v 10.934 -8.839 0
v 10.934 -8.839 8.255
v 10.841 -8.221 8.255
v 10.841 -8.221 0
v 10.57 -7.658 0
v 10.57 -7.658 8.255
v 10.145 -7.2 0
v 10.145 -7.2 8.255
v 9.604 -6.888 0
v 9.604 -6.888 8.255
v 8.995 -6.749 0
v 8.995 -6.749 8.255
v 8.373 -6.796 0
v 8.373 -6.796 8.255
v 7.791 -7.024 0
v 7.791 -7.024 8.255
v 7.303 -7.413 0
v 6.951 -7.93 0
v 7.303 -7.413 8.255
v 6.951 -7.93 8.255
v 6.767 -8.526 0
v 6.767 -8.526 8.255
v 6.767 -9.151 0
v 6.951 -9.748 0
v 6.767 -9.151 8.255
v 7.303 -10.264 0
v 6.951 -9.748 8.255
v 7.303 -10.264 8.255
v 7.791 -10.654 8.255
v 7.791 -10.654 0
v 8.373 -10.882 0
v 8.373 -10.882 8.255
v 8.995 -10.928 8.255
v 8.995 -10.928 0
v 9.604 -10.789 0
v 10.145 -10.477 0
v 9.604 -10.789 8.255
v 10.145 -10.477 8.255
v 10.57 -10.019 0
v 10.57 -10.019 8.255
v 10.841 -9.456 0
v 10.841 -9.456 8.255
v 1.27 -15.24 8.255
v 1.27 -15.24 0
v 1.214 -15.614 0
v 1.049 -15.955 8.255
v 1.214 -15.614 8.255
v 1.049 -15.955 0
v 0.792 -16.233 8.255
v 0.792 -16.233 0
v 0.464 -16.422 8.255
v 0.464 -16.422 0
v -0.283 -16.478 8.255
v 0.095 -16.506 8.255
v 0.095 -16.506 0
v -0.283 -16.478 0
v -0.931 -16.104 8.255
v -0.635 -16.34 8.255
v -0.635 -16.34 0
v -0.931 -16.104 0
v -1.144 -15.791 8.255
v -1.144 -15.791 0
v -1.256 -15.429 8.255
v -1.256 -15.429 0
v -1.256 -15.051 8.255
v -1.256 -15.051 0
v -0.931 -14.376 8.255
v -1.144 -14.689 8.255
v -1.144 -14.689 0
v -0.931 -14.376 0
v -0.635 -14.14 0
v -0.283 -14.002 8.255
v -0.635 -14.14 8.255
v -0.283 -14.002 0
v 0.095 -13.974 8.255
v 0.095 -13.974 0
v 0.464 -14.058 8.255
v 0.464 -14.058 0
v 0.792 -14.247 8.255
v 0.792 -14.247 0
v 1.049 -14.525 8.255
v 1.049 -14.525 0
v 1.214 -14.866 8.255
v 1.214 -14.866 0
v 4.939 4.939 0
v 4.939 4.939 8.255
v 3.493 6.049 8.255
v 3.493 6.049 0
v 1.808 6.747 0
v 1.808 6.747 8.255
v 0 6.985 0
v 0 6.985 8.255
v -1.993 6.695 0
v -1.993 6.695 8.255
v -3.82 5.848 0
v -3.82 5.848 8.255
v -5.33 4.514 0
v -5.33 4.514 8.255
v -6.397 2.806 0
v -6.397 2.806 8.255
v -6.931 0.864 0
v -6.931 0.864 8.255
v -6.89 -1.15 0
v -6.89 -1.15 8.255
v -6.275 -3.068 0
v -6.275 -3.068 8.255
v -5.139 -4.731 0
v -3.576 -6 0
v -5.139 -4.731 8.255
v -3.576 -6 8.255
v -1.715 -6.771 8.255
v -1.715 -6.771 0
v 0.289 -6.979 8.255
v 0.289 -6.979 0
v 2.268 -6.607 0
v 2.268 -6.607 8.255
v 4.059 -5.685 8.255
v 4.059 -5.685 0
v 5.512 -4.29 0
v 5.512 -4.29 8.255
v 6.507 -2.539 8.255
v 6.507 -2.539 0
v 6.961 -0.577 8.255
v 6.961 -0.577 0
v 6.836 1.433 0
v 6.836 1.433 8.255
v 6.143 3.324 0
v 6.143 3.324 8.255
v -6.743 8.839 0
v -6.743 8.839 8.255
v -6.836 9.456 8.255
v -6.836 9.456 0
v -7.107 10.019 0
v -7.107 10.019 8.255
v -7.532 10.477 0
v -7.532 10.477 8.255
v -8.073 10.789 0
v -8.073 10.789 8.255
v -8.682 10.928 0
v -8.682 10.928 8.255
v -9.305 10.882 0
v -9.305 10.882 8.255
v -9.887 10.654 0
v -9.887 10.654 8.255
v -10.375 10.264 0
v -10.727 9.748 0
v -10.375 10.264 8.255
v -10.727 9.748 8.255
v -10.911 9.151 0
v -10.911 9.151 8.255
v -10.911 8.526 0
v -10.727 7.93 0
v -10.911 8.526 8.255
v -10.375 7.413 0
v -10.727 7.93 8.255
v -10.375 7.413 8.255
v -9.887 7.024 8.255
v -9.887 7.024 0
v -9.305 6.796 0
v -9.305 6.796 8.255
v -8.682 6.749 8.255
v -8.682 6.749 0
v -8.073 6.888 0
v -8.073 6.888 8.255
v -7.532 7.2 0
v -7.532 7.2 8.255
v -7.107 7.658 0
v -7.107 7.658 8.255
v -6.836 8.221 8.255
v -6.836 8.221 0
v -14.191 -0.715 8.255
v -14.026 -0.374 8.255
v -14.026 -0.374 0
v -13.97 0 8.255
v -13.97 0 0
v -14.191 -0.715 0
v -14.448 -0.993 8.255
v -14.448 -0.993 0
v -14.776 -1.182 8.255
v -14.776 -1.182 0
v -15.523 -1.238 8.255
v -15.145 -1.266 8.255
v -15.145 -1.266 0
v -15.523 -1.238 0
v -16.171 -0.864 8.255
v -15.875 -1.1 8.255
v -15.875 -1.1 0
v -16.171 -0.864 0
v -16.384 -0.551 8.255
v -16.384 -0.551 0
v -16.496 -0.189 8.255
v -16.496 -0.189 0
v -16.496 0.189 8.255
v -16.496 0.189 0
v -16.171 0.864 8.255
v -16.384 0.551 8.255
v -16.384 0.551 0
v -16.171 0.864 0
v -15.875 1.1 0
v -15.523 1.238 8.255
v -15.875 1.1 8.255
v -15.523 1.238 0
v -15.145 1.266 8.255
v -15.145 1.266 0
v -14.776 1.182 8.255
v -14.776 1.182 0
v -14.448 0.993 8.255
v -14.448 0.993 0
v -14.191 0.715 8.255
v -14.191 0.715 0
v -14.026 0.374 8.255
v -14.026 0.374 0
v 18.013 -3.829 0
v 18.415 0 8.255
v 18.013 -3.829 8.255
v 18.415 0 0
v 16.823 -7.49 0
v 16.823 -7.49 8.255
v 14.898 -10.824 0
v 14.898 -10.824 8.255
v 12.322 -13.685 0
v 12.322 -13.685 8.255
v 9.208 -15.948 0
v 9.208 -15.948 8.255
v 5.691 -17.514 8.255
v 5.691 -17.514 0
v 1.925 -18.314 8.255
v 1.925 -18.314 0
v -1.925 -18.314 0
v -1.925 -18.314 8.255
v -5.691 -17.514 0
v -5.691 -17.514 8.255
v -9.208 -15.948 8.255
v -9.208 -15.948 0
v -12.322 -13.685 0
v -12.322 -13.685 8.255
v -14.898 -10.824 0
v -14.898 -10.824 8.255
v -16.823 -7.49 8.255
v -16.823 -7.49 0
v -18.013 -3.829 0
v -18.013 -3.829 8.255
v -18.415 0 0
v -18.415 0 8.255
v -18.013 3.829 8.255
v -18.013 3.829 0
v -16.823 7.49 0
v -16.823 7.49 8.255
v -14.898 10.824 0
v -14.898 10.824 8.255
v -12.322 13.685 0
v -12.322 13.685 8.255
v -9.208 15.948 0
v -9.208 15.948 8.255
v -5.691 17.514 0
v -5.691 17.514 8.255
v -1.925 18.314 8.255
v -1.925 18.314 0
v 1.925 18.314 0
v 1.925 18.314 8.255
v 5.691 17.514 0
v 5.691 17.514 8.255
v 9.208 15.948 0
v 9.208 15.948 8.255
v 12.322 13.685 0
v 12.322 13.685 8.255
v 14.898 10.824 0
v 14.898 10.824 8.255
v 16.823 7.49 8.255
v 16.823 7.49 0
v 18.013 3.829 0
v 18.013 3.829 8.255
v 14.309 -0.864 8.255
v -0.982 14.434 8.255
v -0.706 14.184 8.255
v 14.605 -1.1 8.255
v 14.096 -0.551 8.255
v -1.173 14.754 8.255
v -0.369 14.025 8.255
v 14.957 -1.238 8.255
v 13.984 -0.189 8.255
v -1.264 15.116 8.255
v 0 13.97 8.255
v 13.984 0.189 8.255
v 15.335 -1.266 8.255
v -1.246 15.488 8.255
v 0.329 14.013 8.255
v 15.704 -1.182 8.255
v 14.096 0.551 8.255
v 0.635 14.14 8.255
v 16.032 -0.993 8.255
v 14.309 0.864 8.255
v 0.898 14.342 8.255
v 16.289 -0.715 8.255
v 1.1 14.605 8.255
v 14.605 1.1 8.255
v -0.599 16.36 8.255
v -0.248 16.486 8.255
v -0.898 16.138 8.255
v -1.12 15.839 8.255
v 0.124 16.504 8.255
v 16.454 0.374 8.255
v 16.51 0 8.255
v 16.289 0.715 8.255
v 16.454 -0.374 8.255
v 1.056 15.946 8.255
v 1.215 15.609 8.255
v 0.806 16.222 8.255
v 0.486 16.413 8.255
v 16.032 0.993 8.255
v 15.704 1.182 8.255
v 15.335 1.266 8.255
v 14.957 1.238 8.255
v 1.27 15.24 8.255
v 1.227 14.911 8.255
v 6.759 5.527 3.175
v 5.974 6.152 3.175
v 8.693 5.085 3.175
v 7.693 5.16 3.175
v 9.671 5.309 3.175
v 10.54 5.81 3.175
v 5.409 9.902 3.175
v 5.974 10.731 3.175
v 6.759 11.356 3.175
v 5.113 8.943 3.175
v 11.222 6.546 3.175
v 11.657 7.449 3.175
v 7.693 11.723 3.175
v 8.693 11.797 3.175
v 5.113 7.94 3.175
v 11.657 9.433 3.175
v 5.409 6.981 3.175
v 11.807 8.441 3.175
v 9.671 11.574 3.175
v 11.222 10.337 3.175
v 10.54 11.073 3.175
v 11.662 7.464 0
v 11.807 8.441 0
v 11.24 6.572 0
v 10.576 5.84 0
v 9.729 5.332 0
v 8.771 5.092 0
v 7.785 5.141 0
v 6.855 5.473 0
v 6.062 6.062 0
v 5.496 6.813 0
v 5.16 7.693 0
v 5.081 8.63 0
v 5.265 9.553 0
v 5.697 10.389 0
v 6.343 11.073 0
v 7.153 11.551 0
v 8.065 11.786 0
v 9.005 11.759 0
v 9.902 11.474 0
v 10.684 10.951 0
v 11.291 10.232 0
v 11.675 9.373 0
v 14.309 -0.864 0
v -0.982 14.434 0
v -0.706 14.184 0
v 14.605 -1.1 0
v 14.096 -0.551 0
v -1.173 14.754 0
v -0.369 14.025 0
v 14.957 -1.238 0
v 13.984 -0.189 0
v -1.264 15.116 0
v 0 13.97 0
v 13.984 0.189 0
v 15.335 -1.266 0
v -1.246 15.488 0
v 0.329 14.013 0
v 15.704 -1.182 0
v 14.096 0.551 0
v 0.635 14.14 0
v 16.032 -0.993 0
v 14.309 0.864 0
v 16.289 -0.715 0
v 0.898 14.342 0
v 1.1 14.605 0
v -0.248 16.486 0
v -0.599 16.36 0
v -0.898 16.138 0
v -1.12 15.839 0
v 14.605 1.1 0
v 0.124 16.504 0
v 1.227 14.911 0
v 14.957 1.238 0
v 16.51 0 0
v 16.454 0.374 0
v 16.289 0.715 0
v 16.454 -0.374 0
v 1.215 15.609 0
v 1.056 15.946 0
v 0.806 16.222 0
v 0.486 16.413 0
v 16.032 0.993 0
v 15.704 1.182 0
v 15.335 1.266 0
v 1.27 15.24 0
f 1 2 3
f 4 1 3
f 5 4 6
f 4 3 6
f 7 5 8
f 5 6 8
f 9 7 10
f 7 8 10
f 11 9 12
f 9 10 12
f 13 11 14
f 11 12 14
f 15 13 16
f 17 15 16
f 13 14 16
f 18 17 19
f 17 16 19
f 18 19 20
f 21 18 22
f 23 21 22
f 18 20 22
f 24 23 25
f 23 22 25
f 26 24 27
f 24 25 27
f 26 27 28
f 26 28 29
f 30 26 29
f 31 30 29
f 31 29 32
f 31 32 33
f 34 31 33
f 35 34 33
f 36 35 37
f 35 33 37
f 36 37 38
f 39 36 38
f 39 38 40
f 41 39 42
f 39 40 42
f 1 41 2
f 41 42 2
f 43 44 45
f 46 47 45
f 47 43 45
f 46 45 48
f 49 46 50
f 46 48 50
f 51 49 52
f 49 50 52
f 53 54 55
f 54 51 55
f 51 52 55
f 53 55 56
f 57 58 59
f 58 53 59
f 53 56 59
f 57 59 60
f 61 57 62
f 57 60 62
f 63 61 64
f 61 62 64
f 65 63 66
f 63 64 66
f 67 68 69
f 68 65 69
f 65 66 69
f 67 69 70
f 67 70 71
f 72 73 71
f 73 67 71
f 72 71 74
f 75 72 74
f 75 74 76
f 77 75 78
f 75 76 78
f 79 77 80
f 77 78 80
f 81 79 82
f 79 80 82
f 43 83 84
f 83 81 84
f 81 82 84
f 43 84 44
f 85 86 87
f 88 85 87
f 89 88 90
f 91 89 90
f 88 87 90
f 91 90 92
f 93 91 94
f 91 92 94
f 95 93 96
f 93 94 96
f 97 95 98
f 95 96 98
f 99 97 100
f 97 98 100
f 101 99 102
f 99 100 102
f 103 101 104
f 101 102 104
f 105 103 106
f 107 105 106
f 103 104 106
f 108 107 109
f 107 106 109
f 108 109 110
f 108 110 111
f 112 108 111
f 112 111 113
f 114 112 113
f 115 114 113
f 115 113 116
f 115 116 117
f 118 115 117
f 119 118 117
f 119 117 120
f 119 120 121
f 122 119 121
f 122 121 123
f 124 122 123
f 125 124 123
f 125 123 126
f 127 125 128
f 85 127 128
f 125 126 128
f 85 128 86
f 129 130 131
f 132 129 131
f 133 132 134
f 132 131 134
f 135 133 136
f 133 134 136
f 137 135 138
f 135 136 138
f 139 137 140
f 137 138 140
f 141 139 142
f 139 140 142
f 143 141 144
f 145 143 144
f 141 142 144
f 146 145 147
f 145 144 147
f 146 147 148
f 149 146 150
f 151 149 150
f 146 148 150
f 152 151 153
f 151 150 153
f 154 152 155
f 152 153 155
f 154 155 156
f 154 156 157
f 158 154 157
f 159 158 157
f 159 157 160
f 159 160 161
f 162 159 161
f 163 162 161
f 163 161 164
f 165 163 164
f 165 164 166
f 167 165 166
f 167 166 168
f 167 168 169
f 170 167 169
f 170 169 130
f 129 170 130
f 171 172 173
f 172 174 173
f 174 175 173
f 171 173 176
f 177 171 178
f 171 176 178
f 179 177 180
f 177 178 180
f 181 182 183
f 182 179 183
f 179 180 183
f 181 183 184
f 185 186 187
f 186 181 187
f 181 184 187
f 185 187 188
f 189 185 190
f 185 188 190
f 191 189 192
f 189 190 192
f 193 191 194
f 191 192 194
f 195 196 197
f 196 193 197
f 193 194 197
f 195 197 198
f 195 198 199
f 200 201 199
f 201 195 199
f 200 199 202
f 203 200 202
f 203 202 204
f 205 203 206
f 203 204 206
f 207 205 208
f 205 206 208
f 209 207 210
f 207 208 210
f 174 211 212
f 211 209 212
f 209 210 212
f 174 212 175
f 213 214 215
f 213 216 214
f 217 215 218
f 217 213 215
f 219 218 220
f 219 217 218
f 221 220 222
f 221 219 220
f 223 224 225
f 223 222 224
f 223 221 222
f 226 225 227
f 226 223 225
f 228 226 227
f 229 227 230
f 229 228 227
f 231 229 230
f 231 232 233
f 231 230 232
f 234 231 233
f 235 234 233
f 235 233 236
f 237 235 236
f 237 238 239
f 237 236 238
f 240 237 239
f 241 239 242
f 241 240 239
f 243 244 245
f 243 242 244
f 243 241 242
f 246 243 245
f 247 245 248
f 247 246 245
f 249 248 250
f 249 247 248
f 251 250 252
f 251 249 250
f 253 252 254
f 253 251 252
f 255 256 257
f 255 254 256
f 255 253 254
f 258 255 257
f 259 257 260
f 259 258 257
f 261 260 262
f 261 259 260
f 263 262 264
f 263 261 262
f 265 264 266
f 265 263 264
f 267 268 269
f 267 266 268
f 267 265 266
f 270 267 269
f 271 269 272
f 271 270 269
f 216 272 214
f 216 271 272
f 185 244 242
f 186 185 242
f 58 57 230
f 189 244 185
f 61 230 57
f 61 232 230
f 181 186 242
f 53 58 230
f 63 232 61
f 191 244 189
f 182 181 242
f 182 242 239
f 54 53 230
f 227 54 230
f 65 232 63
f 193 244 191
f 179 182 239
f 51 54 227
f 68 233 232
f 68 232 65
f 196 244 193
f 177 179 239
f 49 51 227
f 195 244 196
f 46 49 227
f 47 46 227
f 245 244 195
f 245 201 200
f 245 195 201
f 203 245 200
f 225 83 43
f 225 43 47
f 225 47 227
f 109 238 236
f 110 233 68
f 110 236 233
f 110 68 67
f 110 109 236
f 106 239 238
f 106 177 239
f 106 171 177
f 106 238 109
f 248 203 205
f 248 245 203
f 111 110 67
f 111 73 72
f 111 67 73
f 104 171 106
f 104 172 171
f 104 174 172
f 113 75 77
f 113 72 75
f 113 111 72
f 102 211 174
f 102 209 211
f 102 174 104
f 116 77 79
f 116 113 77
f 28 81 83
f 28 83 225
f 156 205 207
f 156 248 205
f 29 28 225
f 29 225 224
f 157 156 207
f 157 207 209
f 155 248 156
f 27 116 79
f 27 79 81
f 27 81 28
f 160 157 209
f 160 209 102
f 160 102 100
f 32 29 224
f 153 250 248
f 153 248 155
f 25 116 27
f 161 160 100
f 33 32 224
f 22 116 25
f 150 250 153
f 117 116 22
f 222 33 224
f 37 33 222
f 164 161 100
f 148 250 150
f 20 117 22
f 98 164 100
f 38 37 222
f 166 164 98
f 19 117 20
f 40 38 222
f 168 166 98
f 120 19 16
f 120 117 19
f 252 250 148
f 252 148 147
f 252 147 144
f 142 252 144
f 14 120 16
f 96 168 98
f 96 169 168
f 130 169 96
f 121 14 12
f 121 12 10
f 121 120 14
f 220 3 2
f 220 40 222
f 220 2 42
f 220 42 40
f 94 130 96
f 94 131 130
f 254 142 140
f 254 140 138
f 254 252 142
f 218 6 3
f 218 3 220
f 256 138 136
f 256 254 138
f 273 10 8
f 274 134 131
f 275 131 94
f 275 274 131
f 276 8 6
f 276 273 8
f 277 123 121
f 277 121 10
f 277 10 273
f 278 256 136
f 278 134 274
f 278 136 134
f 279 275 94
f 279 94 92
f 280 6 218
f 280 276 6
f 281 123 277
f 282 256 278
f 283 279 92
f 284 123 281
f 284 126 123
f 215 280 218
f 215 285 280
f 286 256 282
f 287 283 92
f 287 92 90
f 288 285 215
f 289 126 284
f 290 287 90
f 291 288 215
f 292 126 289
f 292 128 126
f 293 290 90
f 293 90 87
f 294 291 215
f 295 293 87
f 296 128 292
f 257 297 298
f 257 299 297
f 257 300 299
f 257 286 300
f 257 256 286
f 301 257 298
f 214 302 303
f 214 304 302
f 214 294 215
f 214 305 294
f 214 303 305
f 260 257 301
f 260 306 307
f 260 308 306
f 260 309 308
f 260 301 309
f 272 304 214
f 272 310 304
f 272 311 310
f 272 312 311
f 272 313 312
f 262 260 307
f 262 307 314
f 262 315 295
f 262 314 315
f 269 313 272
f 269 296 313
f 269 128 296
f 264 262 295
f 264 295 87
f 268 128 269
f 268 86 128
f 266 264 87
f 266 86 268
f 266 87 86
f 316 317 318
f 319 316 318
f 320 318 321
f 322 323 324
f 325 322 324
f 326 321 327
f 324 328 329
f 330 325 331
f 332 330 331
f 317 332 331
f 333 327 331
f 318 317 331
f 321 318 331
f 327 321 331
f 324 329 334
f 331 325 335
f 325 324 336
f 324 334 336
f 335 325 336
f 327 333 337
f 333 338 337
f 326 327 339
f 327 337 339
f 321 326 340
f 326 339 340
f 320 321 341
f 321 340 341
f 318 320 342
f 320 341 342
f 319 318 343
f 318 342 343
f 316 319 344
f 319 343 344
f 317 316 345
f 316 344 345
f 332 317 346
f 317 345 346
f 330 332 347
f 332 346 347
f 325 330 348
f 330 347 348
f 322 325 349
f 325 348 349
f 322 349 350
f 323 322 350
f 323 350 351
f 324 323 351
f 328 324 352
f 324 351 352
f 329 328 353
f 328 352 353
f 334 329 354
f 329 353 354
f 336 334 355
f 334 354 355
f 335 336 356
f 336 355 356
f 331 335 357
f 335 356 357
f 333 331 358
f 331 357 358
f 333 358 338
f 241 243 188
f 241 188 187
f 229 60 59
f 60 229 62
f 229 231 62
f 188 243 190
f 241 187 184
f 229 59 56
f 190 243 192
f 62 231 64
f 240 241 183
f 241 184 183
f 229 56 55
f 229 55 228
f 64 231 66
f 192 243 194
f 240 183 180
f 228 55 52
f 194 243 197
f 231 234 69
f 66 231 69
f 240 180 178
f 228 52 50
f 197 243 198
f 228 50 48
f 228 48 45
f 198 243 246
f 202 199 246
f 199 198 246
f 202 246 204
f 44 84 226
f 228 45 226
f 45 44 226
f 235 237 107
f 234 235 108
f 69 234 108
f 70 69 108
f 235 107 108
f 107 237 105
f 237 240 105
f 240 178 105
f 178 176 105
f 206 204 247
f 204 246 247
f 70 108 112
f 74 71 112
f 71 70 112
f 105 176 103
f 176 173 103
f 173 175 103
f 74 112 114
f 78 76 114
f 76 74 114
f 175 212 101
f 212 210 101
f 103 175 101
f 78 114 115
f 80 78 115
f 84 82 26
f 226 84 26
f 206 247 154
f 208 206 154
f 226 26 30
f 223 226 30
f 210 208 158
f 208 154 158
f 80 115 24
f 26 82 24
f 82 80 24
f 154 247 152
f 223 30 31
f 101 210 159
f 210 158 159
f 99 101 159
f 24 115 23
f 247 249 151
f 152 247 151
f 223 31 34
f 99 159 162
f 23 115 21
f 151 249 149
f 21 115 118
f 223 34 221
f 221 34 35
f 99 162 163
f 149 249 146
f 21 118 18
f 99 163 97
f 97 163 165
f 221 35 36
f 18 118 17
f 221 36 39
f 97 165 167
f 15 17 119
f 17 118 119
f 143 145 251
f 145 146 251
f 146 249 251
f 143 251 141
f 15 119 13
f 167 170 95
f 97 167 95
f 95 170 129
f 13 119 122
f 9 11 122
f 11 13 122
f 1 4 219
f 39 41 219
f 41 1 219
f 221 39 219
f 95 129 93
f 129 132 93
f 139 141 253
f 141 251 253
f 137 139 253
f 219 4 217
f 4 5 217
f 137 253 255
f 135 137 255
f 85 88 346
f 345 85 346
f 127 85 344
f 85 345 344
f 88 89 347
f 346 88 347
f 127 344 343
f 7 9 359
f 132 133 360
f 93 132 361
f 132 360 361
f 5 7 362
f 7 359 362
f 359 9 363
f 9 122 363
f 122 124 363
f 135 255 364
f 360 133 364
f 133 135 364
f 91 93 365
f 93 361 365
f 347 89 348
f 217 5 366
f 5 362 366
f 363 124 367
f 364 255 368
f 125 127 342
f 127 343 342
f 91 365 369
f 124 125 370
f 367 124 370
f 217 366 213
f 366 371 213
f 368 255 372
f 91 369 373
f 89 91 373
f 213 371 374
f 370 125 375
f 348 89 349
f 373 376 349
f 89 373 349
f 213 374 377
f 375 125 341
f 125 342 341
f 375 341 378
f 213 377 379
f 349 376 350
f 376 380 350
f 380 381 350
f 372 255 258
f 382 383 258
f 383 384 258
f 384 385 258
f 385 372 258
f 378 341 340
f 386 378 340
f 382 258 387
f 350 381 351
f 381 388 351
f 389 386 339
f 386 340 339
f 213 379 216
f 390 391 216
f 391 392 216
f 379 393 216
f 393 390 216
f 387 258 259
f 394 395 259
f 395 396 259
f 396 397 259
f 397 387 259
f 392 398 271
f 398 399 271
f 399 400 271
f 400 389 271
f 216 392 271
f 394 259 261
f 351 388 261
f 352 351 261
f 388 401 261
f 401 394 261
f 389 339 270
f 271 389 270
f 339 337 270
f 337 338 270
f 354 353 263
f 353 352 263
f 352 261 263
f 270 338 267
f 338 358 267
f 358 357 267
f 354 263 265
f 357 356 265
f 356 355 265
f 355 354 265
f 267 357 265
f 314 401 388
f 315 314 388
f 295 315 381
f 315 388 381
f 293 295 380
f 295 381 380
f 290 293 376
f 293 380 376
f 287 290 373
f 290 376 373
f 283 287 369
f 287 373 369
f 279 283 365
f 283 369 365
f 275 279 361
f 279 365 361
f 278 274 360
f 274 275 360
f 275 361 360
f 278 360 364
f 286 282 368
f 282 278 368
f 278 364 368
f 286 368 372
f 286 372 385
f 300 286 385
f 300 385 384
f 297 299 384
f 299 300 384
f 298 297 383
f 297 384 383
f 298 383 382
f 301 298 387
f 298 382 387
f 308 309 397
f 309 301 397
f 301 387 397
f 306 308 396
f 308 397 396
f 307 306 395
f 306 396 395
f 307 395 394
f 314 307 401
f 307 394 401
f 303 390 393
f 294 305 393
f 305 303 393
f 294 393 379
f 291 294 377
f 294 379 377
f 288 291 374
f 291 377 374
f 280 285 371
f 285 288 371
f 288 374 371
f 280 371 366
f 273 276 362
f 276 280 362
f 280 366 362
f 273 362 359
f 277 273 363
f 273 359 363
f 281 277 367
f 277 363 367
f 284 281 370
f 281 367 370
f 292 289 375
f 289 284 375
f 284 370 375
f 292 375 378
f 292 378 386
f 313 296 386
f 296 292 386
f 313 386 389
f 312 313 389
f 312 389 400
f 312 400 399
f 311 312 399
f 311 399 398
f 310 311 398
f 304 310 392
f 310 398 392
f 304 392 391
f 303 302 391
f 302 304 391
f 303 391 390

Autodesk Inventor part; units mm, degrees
ref_plane "YZ Plane" through (0, 0, 0) normal (1, 0, 0) x (0, 1, 0)
ref_plane "XZ Plane" through (0, 0, 0) normal (0, 1, 0) x (-1, 0, 0)
ref_plane "XY Plane" through (0, 0, 0) normal (0, 0, 1) x (1, 0, 0)
sketch "Sketch7" plane through (0, 0, 0) normal (0, 0, 1) x (1, 0, 0)
  line L0 (0, 0) -> (0, 15.24)
  circle A0 centre (0, 15.24) radius 1.27
  circle A1 centre (-15.24, 0) radius 1.27
  circle A2 centre (0, -15.24) radius 1.27
  circle A3 centre (15.24, 0) radius 1.27
  circle A4 centre (0, 0) radius 18.415
  line L1 (0, 0) -> (8.4414, 8.4414)
  line L2 (0, 0) -> (11.938, 0) construction
  circle A5 centre (8.4414, 8.4414) radius 3.3655
  dimension "d82" = 15.24
  dimension "d83" = 2.54
  dimension "d86" = 360
  dimension "d88" = 36.83
  dimension "d89" = 11.938
  dimension "d90" = 45
  dimension "d91" = 6.731
extrude "Extrusion8" add sketch "Sketch7" along normal blind 8.255
sketch "Sketch8" plane through (0, 0, 8.255) normal (0, 0, 1) x (1, 0, 0)
  circle A0 centre (0, 0) radius 6.985
  dimension "d94" = 13.97
extrude "Extrusion9" cut sketch "Sketch8" against normal through all
sketch "Sketch10" plane through (0, 0, 8.255) normal (0, 0, 1) x (1, 0, 0)
  circle A0 centre (8.4414, 8.4414) radius 3.3655 projected
  point P0 (0, 0)
extrude "Extrusion10" add sketch "Sketch10" against normal blind 5.08
sketch "Sketch11" plane through (0, 0, 8.255) normal (0, 0, 1) x (1, 0, 0)
  line L0 (0, 0) -> (-8.8388, 8.8388)
  line L1 (0, 0) -> (12.5, 0) construction
  line L2 (0, 0) -> (8.8388, -8.8388)
  circle A0 centre (-8.8388, 8.8388) radius 2.0955
  circle A1 centre (8.8388, -8.8388) radius 2.0955
  dimension "d99" = 12.5
  dimension "d100" = 135
  dimension "d101" = 12.5
  dimension "d102" = 4.191
  dimension "d103" = 4.191
extrude "Extrusion11" cut sketch "Sketch11" against normal through all
equation "\"d101\" = d99"
equation "\"d102\" = d103"
properties part number "idlerShaftBearingMount" material "ABS Plastic"
